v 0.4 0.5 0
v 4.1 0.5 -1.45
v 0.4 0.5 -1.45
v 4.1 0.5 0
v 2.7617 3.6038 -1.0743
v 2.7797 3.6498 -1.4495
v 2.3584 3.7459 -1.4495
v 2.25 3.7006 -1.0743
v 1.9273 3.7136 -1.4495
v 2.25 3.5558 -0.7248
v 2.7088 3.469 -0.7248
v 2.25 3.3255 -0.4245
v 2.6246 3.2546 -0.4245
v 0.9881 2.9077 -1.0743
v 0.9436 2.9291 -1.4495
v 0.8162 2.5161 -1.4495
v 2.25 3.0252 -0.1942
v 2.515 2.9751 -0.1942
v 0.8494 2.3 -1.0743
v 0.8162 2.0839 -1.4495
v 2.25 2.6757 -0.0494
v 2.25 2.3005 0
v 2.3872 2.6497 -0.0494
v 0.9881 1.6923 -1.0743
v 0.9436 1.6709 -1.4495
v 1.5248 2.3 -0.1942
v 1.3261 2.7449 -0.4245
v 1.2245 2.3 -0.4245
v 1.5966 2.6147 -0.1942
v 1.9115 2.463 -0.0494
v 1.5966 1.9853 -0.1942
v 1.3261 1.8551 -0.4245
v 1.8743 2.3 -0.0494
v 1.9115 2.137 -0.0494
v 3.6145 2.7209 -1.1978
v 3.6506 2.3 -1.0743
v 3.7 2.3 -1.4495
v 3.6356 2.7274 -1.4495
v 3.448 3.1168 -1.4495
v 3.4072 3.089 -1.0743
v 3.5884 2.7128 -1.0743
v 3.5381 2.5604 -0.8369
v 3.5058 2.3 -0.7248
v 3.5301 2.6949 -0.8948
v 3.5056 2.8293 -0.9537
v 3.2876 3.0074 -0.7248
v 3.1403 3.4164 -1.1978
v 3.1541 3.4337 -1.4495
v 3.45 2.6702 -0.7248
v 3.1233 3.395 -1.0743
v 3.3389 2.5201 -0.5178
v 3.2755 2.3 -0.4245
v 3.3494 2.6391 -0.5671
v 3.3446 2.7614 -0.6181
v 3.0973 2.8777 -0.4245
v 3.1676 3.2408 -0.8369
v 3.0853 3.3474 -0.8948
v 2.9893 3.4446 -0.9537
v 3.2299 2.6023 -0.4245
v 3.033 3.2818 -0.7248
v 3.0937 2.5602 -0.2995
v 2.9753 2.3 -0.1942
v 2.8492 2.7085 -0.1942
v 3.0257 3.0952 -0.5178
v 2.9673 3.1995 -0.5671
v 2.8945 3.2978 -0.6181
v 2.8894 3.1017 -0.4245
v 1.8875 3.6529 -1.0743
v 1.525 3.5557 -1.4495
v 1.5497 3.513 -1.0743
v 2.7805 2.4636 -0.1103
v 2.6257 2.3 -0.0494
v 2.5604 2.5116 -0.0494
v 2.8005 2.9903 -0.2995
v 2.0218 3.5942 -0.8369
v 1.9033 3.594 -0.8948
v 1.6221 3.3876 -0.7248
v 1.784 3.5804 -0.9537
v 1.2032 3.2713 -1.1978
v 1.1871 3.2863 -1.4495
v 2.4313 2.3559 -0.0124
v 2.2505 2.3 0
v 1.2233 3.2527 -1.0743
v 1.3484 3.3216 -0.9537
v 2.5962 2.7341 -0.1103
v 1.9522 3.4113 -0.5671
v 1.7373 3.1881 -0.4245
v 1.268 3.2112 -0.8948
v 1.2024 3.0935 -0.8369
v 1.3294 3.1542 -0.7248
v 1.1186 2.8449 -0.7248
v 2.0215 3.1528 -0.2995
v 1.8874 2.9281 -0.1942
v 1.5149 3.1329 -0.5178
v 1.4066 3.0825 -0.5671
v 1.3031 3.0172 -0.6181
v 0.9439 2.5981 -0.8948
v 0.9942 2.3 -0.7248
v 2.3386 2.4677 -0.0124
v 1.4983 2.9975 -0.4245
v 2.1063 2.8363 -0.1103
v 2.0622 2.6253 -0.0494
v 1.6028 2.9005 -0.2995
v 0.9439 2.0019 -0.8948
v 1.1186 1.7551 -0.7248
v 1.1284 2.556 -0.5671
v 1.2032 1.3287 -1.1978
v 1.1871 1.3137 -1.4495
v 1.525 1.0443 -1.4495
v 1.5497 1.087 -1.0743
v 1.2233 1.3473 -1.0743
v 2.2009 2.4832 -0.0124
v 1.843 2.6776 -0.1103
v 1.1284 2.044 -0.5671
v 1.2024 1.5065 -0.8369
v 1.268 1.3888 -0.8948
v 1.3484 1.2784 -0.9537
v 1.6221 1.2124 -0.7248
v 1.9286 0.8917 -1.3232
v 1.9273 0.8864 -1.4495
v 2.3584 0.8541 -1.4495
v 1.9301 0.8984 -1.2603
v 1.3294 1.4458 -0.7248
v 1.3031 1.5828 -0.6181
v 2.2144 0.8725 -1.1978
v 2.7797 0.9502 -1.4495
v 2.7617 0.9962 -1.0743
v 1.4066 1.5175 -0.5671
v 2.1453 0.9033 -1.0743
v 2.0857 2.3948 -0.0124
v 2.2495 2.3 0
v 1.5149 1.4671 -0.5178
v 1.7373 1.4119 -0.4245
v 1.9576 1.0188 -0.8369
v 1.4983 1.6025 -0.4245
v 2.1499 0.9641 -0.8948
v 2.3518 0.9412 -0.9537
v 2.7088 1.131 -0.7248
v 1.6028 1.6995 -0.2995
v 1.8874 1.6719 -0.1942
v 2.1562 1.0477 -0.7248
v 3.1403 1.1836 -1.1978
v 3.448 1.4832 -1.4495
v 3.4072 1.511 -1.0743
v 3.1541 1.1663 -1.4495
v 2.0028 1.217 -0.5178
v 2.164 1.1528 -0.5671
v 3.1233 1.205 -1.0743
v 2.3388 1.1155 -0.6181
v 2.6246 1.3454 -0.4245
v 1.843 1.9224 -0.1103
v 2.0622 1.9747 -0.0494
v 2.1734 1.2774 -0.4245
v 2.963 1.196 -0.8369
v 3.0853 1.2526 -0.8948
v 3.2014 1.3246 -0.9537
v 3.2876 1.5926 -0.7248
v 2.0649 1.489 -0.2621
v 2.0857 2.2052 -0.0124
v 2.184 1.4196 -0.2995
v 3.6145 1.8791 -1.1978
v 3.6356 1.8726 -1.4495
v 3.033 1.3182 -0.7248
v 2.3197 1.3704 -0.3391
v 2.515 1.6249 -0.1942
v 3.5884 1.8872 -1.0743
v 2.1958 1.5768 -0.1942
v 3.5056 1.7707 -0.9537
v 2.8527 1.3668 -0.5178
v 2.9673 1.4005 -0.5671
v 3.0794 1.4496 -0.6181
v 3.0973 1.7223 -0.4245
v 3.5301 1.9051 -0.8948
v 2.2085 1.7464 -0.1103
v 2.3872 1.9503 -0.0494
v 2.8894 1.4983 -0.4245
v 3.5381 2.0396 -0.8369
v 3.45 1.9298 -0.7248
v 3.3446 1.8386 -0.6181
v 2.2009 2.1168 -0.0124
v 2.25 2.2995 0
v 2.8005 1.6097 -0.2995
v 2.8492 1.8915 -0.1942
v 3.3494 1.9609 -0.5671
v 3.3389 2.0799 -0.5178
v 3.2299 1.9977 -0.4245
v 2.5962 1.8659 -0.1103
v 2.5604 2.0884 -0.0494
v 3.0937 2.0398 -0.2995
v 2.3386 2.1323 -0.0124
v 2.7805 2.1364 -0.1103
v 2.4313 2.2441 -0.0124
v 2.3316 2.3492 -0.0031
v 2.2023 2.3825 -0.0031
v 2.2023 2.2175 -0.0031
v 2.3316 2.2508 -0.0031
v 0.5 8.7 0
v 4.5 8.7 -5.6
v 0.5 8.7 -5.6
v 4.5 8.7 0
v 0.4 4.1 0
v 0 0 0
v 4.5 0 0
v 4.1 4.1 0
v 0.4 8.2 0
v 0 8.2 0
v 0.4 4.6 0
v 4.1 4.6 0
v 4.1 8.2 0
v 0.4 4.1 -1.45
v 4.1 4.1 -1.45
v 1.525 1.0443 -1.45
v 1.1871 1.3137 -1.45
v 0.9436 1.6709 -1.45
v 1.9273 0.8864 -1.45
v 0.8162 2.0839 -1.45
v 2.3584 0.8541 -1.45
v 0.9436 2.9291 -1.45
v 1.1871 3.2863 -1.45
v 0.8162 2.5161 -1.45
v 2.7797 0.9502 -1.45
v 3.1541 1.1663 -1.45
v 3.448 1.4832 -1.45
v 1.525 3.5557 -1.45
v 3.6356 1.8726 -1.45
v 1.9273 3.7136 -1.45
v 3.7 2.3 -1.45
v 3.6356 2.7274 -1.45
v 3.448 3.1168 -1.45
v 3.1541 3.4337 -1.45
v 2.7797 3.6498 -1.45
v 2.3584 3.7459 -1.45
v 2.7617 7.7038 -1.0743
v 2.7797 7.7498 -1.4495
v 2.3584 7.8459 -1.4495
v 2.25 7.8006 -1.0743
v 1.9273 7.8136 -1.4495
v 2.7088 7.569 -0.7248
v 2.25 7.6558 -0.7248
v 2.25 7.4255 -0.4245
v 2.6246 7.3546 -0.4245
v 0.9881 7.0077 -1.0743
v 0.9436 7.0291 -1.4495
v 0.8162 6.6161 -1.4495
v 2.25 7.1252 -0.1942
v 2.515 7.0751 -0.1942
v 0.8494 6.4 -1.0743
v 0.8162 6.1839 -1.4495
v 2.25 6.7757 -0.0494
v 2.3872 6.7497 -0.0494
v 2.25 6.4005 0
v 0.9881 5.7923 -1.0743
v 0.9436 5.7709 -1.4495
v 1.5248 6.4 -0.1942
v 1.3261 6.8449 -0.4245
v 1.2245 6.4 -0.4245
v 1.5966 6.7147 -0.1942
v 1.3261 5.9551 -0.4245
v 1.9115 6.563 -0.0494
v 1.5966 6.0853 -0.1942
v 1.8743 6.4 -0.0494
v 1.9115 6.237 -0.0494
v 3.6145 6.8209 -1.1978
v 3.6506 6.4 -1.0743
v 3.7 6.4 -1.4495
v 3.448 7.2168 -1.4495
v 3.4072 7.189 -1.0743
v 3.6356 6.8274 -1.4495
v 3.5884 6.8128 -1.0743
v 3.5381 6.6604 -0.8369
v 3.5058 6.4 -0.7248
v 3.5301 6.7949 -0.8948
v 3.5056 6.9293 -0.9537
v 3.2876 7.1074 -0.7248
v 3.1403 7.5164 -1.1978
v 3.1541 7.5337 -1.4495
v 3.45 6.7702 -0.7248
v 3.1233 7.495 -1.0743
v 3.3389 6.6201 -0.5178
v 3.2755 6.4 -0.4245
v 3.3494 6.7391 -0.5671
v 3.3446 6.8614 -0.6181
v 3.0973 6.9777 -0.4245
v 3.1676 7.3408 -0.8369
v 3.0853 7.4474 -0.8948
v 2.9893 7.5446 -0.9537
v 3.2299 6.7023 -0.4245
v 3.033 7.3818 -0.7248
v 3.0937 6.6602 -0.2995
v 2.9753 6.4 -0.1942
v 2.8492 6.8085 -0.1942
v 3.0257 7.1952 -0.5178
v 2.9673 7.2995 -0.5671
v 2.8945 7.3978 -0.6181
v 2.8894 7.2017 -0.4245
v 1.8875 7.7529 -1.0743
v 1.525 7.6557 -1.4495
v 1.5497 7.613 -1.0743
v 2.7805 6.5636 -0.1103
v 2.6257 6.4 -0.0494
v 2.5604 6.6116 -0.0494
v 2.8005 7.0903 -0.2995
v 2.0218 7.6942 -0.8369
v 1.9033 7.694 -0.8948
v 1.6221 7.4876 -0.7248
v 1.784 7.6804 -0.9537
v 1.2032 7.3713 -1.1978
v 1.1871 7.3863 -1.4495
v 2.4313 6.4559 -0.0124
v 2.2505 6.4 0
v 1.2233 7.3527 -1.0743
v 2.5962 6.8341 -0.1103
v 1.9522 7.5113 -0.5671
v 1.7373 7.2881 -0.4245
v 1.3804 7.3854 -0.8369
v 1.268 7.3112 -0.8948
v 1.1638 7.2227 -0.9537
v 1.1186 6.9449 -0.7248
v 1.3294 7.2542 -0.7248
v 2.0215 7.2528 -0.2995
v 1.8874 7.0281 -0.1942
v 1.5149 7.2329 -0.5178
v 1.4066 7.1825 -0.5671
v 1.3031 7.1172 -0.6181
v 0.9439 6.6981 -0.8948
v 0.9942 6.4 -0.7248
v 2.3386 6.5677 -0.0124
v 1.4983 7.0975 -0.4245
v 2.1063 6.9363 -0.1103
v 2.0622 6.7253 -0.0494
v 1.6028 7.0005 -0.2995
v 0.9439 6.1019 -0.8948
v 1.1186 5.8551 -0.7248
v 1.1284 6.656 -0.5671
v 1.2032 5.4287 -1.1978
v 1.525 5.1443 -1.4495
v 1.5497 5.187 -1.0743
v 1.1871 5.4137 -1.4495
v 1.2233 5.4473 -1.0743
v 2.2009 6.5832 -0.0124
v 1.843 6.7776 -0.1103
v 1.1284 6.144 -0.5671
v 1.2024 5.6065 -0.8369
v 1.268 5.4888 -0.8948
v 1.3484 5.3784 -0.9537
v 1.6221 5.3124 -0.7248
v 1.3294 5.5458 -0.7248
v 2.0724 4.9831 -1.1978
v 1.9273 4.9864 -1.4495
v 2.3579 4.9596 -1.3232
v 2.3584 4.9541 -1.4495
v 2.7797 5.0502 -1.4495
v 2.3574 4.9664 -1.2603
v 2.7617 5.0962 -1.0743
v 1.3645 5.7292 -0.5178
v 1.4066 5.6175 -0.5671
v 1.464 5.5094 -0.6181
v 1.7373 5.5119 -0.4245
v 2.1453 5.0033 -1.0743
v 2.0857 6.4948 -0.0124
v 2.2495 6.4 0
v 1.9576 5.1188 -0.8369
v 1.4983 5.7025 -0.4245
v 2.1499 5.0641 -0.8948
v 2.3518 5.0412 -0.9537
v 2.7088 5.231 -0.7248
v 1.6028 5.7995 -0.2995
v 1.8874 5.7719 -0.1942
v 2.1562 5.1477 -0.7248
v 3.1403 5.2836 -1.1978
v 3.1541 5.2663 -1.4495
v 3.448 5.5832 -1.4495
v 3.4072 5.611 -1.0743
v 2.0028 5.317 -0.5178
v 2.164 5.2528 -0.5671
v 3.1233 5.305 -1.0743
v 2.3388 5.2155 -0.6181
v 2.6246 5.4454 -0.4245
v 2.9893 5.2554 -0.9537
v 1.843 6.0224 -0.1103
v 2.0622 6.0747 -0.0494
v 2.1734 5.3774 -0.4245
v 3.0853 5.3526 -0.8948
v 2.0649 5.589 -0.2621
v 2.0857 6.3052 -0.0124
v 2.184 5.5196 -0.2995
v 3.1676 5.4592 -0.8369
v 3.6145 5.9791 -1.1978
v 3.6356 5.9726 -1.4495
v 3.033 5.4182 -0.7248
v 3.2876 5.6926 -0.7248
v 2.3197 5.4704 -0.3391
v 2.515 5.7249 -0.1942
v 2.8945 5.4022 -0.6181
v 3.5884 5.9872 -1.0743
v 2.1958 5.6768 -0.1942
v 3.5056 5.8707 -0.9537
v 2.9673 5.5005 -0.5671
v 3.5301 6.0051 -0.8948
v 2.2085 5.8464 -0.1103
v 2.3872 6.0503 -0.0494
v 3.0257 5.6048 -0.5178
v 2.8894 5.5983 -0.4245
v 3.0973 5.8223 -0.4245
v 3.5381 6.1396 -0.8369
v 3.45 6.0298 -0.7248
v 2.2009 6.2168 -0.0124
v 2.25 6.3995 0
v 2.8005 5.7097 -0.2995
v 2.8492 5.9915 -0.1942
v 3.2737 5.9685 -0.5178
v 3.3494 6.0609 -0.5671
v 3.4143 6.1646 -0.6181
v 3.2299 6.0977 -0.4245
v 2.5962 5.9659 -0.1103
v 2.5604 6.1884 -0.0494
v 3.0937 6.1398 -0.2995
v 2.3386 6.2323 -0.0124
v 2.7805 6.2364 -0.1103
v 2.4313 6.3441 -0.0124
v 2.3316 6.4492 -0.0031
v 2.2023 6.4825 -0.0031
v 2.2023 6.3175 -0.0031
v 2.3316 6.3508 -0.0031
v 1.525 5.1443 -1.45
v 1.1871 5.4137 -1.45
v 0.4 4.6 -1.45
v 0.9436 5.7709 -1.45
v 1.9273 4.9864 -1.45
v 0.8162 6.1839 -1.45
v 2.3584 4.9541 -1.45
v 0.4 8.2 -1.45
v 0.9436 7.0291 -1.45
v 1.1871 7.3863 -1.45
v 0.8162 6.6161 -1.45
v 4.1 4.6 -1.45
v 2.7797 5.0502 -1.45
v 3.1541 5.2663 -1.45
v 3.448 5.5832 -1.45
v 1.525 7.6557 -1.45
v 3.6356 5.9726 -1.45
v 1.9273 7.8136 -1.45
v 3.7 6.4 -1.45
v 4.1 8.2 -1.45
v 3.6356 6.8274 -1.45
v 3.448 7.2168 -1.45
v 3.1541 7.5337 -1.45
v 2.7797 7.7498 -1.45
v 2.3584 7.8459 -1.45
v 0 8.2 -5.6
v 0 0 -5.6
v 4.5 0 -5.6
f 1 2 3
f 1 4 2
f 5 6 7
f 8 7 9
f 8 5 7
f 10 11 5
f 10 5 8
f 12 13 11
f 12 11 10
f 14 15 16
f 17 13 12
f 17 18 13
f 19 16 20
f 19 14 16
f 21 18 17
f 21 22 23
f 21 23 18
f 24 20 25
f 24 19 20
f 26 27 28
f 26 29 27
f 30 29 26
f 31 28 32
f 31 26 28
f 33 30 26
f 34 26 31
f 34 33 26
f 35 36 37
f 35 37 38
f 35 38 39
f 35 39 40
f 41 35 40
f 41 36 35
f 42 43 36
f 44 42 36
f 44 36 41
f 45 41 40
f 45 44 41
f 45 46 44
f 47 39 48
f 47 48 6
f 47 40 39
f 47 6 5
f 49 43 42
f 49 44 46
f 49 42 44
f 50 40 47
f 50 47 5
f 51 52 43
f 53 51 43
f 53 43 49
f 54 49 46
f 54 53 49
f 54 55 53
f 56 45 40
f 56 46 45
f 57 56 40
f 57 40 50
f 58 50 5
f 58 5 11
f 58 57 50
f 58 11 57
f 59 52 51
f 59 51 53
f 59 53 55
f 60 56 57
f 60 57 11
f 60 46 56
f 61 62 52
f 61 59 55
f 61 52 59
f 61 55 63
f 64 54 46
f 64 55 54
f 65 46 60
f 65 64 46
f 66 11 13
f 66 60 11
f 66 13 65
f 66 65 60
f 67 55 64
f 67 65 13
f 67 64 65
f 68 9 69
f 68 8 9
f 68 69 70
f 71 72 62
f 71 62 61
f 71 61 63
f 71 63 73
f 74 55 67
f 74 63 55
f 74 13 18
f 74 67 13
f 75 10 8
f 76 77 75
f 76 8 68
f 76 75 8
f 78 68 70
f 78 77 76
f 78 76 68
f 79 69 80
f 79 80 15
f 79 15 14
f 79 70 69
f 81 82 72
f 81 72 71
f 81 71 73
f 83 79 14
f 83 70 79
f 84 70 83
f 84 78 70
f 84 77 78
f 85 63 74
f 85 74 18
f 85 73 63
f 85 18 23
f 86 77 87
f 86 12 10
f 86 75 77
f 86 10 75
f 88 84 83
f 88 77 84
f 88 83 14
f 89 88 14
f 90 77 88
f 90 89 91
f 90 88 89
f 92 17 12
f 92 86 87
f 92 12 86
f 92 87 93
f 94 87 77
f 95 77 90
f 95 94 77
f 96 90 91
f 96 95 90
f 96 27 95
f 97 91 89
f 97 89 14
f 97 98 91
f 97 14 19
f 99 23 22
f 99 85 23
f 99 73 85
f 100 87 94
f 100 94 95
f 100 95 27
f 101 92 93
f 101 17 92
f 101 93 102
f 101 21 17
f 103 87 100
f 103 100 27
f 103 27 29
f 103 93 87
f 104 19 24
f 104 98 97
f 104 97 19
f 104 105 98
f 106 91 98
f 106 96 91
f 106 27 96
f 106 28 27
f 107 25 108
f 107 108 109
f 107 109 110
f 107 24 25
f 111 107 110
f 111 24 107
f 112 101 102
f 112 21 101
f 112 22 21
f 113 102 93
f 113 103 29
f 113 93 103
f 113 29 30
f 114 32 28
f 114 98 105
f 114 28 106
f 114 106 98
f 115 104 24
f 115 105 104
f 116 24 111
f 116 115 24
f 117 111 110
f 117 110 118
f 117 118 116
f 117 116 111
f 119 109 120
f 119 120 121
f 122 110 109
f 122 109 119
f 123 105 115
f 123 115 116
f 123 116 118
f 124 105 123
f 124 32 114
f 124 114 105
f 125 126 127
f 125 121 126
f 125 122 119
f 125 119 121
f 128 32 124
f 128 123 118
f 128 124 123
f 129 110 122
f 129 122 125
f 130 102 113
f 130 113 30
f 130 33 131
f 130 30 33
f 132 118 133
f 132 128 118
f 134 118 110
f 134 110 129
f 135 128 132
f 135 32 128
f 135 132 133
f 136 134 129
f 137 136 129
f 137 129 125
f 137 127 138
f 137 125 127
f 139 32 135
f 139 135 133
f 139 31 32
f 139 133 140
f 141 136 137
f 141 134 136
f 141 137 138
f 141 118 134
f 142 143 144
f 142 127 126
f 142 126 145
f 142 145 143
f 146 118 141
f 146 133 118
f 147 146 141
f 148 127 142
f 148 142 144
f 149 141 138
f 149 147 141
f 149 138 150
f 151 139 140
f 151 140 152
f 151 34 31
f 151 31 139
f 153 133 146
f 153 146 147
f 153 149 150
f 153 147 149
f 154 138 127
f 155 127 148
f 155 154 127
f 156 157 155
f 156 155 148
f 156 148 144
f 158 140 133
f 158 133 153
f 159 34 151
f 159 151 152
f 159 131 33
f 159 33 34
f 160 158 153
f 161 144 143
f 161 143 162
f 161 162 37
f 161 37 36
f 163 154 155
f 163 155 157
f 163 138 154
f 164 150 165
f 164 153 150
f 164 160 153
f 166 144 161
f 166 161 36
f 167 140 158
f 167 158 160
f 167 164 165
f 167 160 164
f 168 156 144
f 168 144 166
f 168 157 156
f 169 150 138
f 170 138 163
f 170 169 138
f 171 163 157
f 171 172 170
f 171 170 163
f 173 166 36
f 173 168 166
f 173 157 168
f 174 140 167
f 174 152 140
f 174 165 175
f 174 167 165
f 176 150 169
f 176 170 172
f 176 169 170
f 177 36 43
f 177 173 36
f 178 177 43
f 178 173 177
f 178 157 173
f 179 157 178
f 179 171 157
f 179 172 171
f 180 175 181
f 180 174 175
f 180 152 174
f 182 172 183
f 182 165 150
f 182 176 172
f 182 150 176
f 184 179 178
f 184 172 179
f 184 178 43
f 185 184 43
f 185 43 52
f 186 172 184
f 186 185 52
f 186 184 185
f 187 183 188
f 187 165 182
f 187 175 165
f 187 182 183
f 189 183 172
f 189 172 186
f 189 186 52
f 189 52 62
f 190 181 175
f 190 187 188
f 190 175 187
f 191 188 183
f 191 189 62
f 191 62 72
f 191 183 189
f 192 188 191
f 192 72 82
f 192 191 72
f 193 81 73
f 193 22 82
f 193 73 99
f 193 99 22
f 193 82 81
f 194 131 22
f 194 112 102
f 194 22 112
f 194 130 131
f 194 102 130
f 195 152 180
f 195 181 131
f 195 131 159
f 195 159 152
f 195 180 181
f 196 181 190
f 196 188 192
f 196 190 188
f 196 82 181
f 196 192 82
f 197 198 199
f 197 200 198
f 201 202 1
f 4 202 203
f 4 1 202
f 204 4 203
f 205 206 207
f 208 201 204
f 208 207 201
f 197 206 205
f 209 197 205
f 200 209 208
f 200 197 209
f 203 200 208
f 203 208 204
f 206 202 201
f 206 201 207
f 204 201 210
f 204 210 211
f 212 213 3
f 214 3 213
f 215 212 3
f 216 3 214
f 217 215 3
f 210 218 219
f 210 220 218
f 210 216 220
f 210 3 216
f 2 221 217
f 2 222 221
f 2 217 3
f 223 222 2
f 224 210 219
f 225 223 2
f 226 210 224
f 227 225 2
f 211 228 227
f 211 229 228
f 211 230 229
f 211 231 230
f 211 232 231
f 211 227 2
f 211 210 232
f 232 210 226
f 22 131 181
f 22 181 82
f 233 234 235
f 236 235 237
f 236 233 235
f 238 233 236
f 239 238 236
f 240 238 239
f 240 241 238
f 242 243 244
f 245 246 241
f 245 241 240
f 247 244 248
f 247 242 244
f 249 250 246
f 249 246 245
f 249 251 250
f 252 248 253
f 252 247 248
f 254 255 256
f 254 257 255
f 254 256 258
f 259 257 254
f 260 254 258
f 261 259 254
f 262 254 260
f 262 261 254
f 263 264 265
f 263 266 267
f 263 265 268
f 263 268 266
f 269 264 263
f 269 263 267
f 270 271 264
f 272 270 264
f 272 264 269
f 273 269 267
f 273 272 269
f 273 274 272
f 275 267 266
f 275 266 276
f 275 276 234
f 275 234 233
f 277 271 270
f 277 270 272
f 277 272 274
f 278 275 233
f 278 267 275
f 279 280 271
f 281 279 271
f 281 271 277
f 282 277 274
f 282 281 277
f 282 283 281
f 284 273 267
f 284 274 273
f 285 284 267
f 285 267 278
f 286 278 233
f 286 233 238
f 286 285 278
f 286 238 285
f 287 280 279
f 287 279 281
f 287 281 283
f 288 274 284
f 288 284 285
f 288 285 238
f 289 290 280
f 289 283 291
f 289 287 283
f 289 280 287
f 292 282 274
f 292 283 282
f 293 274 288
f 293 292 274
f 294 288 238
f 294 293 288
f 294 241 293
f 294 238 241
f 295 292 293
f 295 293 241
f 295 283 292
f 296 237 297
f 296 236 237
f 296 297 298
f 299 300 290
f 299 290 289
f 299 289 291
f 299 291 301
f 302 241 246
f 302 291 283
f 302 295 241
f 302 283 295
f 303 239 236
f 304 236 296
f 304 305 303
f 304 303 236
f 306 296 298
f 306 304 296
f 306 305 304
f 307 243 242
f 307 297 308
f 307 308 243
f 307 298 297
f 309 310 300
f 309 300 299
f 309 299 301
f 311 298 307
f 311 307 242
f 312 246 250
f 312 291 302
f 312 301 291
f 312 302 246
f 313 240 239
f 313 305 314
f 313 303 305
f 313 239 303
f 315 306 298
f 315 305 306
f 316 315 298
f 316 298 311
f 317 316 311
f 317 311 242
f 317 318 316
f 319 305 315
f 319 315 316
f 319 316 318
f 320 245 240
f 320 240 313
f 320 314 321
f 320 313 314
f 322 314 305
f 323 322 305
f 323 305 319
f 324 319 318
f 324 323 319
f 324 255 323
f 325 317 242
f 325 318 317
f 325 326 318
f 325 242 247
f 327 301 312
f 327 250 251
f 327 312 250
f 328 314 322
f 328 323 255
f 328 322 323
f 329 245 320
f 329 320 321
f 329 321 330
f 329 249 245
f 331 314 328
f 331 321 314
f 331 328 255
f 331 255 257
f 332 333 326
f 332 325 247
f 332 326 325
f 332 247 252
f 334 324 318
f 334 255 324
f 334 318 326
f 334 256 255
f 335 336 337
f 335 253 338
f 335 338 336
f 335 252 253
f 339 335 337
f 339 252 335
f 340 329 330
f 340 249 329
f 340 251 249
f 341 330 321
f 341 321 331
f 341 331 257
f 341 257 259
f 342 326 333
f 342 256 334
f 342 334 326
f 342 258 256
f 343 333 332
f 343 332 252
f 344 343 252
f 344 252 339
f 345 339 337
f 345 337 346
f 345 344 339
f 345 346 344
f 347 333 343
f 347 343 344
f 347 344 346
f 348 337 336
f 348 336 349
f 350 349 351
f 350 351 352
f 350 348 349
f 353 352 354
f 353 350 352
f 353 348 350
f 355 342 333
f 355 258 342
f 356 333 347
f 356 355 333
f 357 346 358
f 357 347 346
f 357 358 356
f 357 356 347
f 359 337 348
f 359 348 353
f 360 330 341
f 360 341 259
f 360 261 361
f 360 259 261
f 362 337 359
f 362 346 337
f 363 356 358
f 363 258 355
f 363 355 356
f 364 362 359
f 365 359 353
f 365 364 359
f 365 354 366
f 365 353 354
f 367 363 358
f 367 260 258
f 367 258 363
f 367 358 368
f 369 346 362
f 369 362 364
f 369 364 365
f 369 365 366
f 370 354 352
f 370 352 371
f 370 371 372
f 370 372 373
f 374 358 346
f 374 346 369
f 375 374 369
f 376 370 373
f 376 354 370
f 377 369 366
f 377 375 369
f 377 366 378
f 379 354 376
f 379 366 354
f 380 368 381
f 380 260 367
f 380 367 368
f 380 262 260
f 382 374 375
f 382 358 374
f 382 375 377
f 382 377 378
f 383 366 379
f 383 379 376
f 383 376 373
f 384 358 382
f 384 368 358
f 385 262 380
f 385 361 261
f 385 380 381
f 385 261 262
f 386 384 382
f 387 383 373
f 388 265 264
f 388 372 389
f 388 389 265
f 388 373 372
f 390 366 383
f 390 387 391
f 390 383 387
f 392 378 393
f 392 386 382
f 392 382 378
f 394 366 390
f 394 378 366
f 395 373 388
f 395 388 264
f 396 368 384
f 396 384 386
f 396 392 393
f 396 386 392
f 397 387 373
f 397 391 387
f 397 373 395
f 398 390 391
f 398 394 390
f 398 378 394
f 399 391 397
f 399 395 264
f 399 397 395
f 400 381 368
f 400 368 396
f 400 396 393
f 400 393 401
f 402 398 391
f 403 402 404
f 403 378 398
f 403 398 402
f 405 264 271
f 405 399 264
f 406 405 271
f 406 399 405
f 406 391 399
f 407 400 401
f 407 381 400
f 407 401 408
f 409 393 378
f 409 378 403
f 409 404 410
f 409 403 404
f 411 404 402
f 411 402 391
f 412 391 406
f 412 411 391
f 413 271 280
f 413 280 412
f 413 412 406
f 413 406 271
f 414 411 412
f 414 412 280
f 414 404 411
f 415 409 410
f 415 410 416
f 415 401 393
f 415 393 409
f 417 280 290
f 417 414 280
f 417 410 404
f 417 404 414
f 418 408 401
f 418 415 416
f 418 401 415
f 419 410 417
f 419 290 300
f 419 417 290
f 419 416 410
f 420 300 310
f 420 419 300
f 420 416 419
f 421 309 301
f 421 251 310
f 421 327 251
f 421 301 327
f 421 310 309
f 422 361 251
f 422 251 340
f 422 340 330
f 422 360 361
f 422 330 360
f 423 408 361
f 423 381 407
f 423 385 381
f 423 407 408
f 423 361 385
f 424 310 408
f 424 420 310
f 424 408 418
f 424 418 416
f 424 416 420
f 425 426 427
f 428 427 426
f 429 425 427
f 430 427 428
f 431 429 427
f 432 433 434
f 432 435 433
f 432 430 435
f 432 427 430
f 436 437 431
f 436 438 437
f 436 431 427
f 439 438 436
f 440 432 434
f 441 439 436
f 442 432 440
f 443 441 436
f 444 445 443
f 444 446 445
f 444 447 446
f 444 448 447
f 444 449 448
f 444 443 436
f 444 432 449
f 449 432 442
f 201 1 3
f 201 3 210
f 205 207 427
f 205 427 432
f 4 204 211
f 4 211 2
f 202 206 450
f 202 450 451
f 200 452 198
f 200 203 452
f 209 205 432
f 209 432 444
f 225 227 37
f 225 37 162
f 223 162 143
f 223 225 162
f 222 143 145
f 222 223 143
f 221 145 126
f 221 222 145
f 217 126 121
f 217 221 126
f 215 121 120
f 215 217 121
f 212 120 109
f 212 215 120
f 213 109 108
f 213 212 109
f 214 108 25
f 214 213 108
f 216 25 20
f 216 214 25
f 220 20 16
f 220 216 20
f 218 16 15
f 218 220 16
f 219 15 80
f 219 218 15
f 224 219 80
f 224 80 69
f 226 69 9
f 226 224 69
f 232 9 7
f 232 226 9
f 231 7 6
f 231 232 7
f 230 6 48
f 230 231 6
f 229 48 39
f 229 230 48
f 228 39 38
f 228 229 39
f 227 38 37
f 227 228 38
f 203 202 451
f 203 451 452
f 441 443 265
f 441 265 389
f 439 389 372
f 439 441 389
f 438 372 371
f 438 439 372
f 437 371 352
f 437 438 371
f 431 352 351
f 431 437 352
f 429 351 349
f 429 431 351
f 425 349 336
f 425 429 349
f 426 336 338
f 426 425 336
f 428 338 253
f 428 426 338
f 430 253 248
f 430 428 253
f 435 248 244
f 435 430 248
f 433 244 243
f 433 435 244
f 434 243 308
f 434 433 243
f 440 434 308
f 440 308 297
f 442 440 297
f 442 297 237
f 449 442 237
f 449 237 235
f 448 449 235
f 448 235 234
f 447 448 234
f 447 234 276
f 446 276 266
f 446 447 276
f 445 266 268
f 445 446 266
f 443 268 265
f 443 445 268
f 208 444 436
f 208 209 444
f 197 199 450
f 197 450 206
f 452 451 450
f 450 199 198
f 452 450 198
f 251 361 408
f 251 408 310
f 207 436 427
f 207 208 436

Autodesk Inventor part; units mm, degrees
ref_plane "YZ Plane" through (0, 0, 0) normal (1, 0, 0) x (0, 1, 0)
ref_plane "XZ Plane" through (0, 0, 0) normal (0, 1, 0) x (-1, 0, 0)
ref_plane "XY Plane" through (0, 0, 0) normal (0, 0, 1) x (1, 0, 0)
sketch "スケッチ1" plane through (0, 0, 0) normal (0, 0, 1) x (1, 0, 0)
  line L0 (0, 0) -> (4.5, 0)
  line L1 (4.5, 0) -> (4.5, 8.7)
  line L2 (4.5, 8.7) -> (0, 8.7)
  line L3 (0, 8.7) -> (0, 0)
  dimension "d0" = 4.5
  dimension "d1" = 8.7
extrude "押し出し1" add sketch "スケッチ1" against normal blind 5.6
chamfer "面取り1" distance 0.5 angle 45 1 edges at (0, 8.7, -2.8)
sketch "スケッチ2" plane through (0, 0, 0) normal (0, 0, 1) x (1, 0, 0)
  line L0 (0.4, 8.2) -> (4.1, 8.2)
  line L1 (4.1, 8.2) -> (4.1, 4.6)
  line L2 (4.1, 4.6) -> (0.4, 4.6)
  line L3 (0.4, 4.6) -> (0.4, 8.2)
  line L4 (0.4, 4.1) -> (4.1, 4.1)
  line L5 (4.1, 4.1) -> (4.1, 0.5)
  line L6 (4.1, 0.5) -> (0.4, 0.5)
  line L7 (0.4, 0.5) -> (0.4, 4.1)
  line L8 (0, 0) -> (4.5, 0) projected
  line L9 (4.5, 8.7) -> (0.5, 8.7) projected
  point P0 (2.25, 0)
  point P1 (2.25, 0.5)
  dimension "d7" = 3.7
  dimension "d8" = 3.6
  dimension "d9" = 3.6
  dimension "d10" = 0.5
  dimension "d11" = 0.5
extrude "押し出し2" cut sketch "スケッチ2" against normal blind 1.45
sketch "スケッチ3" plane through (0, 0, -1.45) normal (0, 0, 1) x (1, 0, 0)
  line L0 (4.1, 4.6) -> (0.4, 4.6) projected
  line L1 (4.1, 8.2) -> (4.1, 4.6) projected
  line L2 (0.4, 8.2) -> (4.1, 8.2) projected
  line L3 (0.4, 4.6) -> (0.4, 8.2) projected
  line L4 (4.1, 0.5) -> (0.4, 0.5) projected
  line L5 (4.1, 4.1) -> (4.1, 0.5) projected
  line L6 (0.4, 4.1) -> (4.1, 4.1) projected
  line L7 (0.4, 0.5) -> (0.4, 4.1) projected
  circle A0 centre (2.25, 6.4) radius 1.45
  circle A1 centre (2.25, 2.3) radius 1.45
  line L8 (4.1, 4.1) -> (4.1, 0.5) projected
  line L9 (4.1, 8.2) -> (4.1, 4.6) projected
  line L10 (0.4, 8.2) -> (4.1, 8.2) projected
  line L11 (0.4, 4.1) -> (4.1, 4.1) projected
  point P0 (0, 0)
  point P1 (4.1, 2.3)
  point P2 (4.1, 6.4)
  point P3 (2.25, 8.2)
  point P4 (2.25, 4.1)
  dimension "d14" = 2.9
  dimension "d15" = 2.9
extrude "押し出し3" add sketch "スケッチ3" along normal blind 1.45 contours A0 | A1
fillet "フィレット1" radius 1.45 2 edges at (0.8, 6.4, 0) (0.8, 2.3, 0)
properties part number "LBR127HLD"
